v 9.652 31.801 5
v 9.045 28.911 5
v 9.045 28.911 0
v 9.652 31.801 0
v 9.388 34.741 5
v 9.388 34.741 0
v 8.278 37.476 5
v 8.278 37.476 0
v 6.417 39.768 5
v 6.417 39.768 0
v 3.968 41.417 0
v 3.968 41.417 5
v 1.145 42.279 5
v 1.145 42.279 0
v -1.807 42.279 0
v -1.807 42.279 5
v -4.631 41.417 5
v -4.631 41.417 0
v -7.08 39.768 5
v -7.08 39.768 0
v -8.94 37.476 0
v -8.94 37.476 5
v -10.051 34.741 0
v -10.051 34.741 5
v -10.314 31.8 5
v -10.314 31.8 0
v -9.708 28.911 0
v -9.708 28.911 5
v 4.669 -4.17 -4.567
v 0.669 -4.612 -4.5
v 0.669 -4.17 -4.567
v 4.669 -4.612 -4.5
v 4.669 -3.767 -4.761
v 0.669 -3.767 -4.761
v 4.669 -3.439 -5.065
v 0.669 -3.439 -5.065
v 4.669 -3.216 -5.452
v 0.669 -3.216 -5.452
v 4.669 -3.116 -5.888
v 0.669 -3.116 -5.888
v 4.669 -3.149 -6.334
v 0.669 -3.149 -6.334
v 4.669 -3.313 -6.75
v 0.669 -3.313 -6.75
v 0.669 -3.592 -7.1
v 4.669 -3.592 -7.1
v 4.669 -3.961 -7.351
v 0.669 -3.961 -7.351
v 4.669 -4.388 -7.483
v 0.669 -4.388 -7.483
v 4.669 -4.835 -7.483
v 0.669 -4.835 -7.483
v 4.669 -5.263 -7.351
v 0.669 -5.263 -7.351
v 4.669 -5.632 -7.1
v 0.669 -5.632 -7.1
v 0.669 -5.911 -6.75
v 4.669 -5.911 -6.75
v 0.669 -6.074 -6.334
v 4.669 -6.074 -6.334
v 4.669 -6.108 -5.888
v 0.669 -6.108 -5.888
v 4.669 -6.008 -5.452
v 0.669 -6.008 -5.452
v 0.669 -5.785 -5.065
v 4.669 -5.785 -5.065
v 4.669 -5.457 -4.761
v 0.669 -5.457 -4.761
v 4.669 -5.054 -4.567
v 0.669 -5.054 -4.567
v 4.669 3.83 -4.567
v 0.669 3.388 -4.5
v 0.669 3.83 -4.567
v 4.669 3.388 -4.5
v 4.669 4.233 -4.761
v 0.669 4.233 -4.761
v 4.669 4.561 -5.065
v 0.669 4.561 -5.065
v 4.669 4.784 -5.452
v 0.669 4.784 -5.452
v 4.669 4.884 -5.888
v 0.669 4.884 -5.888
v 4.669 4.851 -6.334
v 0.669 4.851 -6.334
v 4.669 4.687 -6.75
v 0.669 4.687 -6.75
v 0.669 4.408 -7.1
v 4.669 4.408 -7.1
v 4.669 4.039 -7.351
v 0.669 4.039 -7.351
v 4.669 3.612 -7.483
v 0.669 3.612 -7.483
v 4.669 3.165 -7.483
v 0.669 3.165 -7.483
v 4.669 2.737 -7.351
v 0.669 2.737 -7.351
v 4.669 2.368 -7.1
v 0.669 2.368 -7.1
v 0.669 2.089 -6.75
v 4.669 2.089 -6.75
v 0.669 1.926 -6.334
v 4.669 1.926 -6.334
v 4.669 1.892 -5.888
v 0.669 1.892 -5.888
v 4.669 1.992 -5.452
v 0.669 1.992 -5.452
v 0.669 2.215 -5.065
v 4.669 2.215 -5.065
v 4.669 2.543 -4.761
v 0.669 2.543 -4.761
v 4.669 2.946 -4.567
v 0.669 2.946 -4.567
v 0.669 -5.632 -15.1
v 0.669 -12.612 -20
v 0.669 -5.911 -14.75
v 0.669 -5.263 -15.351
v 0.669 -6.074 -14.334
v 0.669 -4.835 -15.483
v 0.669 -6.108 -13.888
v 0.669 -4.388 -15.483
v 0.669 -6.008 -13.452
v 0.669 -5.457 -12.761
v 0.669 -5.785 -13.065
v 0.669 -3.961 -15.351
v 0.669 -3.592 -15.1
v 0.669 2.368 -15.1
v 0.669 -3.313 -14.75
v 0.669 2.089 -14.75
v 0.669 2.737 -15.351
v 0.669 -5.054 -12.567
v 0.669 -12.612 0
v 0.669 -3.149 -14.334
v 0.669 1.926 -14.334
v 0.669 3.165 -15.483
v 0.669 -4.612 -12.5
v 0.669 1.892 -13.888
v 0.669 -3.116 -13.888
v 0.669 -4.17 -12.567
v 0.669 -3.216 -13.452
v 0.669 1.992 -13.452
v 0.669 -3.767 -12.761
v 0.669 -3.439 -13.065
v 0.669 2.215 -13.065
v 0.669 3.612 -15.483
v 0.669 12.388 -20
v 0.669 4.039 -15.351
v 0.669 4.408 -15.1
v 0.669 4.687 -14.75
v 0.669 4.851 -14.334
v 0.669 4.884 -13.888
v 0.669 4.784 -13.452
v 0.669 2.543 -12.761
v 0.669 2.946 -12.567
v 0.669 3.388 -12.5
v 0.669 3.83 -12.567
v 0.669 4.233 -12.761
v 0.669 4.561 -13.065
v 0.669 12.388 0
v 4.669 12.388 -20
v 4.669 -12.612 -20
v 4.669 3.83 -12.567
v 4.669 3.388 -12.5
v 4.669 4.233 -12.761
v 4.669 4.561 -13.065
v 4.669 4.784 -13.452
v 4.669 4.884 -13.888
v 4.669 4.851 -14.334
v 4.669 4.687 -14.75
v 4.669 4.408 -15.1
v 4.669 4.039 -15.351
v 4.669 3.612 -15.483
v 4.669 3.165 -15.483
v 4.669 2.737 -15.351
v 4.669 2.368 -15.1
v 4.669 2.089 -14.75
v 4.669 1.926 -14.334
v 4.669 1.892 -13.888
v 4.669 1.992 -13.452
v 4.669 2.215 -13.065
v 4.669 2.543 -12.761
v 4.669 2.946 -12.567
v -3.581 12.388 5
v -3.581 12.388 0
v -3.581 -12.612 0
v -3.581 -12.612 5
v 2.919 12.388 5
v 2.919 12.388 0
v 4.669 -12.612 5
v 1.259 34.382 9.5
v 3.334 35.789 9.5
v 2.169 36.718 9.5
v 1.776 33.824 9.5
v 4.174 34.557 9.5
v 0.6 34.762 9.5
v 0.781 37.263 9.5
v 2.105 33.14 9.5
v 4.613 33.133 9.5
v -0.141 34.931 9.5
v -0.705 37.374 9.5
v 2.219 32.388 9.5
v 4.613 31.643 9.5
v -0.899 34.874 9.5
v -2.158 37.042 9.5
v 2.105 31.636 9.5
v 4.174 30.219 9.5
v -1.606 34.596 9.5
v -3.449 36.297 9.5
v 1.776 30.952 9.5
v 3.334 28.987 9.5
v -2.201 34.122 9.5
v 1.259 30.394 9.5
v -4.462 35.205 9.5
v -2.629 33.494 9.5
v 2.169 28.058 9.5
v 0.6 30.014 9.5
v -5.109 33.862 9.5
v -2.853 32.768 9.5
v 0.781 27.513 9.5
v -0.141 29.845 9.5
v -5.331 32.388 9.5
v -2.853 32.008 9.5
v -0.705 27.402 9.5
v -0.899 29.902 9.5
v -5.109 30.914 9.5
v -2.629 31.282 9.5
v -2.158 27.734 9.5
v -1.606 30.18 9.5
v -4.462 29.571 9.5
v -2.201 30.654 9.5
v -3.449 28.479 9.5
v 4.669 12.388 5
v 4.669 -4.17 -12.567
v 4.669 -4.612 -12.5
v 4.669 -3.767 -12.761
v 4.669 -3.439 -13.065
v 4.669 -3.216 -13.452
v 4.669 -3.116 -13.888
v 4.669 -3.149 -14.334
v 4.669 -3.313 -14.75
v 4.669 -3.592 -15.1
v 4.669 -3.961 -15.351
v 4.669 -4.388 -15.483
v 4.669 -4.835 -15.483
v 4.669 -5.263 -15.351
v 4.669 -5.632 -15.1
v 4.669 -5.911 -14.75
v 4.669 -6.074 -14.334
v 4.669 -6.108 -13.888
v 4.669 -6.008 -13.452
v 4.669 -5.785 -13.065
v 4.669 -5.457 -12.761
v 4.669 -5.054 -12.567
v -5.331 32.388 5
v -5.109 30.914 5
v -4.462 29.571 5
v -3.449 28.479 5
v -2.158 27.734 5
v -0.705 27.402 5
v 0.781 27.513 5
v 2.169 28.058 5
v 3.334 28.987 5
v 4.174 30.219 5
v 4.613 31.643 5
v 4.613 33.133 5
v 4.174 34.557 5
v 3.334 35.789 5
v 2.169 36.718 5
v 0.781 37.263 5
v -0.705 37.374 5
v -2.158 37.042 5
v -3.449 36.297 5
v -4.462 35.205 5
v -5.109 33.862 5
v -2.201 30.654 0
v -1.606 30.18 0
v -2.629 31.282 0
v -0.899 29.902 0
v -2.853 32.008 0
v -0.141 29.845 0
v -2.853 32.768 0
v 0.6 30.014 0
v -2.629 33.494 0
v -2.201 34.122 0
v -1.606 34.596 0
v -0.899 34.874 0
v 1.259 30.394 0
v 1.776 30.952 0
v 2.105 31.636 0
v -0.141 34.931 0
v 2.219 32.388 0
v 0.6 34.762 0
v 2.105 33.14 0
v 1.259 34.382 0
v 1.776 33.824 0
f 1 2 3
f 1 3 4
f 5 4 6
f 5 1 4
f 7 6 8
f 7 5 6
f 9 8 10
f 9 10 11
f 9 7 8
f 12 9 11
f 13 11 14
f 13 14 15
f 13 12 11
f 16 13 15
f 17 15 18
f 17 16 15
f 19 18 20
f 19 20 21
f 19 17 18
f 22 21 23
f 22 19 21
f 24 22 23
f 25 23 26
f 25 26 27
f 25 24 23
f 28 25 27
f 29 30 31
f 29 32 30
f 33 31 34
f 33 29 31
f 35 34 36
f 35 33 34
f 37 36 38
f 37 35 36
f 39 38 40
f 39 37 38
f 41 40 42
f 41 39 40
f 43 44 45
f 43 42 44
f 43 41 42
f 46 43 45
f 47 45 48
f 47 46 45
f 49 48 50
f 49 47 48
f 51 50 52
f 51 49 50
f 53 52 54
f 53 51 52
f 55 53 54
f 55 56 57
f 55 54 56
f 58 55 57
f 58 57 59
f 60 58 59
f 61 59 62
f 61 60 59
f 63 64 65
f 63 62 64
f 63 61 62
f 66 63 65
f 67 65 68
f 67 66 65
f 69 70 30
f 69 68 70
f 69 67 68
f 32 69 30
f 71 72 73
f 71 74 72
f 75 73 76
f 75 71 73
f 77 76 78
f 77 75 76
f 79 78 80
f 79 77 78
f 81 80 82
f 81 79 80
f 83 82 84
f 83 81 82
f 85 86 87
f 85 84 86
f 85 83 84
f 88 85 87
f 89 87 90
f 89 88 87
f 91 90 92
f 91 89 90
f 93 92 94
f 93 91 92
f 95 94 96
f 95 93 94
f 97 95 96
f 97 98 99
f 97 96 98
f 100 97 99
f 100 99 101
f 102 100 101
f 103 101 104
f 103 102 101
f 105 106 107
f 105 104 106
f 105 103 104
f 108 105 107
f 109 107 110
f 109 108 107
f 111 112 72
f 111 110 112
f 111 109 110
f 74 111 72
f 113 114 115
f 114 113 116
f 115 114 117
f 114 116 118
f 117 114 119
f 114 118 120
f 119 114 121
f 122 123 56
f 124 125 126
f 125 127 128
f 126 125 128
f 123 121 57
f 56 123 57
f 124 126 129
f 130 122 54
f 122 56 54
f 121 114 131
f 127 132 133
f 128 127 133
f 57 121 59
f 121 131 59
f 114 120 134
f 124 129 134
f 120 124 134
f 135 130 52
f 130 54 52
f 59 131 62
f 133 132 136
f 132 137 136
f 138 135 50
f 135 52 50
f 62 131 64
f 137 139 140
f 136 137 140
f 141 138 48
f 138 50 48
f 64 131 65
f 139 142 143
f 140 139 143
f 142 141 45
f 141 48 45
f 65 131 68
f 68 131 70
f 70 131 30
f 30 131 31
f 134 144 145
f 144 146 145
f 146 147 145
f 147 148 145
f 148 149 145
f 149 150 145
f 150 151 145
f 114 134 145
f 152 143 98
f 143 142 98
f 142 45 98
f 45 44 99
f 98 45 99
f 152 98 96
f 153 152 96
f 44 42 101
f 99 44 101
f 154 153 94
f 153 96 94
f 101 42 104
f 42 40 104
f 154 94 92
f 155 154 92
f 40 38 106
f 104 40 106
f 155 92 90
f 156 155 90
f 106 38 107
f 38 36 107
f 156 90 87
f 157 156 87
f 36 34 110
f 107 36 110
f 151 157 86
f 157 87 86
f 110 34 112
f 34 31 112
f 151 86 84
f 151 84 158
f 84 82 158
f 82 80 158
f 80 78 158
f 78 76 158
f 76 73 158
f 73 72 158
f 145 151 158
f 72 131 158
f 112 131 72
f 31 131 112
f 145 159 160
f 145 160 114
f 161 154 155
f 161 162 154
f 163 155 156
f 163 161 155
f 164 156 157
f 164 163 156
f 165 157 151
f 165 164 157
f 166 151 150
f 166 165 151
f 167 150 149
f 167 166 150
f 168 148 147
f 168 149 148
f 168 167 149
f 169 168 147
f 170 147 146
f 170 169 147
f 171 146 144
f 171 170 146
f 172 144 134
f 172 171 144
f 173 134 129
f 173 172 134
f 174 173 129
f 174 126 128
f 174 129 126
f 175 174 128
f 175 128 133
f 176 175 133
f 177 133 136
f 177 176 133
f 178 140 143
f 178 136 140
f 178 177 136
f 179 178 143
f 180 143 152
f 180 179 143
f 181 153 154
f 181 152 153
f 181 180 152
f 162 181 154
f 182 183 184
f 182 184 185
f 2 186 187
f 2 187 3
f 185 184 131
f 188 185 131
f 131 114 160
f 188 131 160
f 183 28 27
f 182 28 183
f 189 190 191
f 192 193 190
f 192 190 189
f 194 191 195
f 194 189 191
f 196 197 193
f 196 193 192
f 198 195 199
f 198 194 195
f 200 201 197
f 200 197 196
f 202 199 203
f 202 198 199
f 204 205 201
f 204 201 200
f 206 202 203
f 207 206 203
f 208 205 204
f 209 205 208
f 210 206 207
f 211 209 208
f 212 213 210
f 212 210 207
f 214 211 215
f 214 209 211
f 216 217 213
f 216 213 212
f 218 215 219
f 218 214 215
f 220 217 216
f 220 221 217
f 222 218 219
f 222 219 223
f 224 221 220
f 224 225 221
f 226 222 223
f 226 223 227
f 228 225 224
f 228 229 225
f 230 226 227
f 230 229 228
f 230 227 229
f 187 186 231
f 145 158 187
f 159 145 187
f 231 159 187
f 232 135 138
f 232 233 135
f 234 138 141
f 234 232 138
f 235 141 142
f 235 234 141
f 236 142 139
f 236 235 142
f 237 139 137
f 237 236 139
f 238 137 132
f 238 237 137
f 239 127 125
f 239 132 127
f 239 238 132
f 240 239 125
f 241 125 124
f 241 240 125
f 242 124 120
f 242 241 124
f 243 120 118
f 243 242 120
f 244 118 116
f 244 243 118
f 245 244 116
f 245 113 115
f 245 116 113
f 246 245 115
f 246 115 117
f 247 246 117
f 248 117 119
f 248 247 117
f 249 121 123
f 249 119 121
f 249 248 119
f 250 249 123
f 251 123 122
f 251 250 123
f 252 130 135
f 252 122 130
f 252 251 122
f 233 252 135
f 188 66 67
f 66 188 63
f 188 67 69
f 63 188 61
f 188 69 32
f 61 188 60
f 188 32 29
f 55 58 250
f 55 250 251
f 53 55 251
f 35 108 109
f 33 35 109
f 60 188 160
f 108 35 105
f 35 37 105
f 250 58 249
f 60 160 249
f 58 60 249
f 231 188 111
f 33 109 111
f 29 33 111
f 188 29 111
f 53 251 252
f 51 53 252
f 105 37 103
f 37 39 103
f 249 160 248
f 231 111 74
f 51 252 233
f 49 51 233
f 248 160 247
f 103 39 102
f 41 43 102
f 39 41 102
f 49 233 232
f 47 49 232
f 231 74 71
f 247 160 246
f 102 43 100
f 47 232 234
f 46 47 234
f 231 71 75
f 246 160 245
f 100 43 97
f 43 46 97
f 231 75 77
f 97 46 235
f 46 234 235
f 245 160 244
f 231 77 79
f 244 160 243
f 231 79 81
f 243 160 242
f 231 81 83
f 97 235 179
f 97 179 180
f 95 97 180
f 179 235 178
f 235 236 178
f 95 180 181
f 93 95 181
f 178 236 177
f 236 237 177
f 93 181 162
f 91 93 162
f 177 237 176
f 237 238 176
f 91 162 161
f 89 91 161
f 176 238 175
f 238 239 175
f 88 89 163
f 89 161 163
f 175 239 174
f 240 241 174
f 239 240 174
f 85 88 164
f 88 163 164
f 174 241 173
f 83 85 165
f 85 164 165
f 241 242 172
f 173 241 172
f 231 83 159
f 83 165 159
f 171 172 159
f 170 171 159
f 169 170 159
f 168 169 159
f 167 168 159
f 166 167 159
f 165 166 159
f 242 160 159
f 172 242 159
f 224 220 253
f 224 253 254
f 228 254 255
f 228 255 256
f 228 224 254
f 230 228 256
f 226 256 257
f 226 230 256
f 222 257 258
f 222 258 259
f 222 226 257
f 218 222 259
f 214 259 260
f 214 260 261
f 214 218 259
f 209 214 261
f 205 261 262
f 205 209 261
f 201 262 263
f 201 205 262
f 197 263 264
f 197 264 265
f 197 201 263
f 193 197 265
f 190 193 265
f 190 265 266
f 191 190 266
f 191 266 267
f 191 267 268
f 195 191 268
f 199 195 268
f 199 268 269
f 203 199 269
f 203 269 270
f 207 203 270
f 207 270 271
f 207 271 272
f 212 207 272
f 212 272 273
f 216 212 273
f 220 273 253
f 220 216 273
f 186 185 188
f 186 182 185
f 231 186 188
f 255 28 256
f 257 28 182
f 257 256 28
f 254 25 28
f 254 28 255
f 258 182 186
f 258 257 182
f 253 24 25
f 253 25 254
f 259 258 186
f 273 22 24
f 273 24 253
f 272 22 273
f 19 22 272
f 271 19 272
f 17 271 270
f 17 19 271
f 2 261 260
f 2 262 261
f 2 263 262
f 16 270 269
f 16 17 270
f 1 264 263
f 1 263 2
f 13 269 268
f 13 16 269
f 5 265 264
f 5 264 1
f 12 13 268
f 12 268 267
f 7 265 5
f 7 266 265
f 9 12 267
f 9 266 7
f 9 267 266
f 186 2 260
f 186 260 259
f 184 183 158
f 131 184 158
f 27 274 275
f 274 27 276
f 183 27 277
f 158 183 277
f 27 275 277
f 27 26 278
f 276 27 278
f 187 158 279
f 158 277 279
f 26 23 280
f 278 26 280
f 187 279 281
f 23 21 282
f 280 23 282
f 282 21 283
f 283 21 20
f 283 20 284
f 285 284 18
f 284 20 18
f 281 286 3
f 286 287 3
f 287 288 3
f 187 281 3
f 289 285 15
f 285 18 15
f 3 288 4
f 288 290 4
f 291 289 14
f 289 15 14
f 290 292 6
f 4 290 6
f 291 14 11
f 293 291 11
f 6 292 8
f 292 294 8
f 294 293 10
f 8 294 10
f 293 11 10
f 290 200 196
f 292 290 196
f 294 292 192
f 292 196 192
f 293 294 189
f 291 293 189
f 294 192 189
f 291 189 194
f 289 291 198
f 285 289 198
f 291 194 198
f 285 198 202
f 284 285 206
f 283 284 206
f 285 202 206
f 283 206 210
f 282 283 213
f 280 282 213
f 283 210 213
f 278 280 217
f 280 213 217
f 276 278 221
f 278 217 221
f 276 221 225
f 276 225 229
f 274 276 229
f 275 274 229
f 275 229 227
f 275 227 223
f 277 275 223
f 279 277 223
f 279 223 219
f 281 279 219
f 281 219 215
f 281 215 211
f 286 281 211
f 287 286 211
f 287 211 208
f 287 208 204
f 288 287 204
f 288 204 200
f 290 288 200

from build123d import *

# Parameters (mm, degrees)
SKETCH_1_R          = 1.25
EXTRUDE_1_DEPTH     = 5
SKETCH_2_W          = 5
SKETCH_2_H          = 25
EXTRUDE_2_DEPTH     = 4
SKETCH_3_W          = 4
SKETCH_3_H          = 25
EXTRUDE_3_DEPTH     = 20
SKETCH_4_R          = 1.5
CUT_EXTRUDE_1_DEPTH = 20
EXTRUDE_START       = -5
SKETCH_7_R          = 1.25
EXTRUDE_4_DEPTH     = 5
SKETCH_8_R          = 1.5
SKETCH_8_R_2        = 4
EXTRUDE_5_DEPTH     = 5
EXTRUDE_START_2     = 4
SKETCH_14_W         = 25
SKETCH_14_H         = 25
SKETCH_14_R         = 1.5
EXTRUDE_9_DEPTH     = 4
SKETCH_15_W         = 4
SKETCH_15_H         = 25
CUT_EXTRUDE_2_DEPTH = 100
SKETCH_16_R         = 10.000418411
SKETCH_16_R_2       = 2.55
EXTRUDE_10_DEPTH    = 5
EXTRUDE_START_3     = 4.5
SKETCH_18_R         = 5
SKETCH_18_R_2       = 2.55
EXTRUDE_11_DEPTH    = 4.5
SKETCH_19_W         = 25
SKETCH_19_H         = 25
SKETCH_19_R         = 1.5
EXTRUDE_12_DEPTH    = 4
SKETCH_20_W         = 25
SKETCH_20_H         = 25
CUT_EXTRUDE_3_DEPTH = 4
SKETCH_21_W         = 1.749900533
SKETCH_21_H         = 25
EXTRUDE_13_DEPTH    = 20
CUT_EXTRUDE_START   = -20
SKETCH_22_R         = 1.5
CUT_EXTRUDE_4_DEPTH = 20
SKETCH_23_W         = 25
SKETCH_23_H         = 25
CUT_EXTRUDE_5_DEPTH = 4
SKETCH_24_W         = 1.749900533
SKETCH_24_H         = 25
EXTRUDE_14_DEPTH    = 5


with BuildPart() as part:
    # 草图1 → 凸台-拉伸1 (new body)
    with BuildSketch(Plane.XY):
        Polygon((-3.581151343, -8.027992706), (-3.581151343, -12.611885422), (2.918848657, -12.611885422), (2.918848657, -6.641886627), (2.918848657, 12.388114578), (-3.581151343, 12.388114578), align=None)
        with Locations((-0.081151343, 8.237522913)):
            Circle(SKETCH_1_R, mode=Mode.SUBTRACT)
        with Locations((-0.081151343, 2.787522913)):
            Circle(SKETCH_1_R, mode=Mode.SUBTRACT)
        with Locations((-0.081151343, -2.662477087)):
            Circle(SKETCH_1_R, mode=Mode.SUBTRACT)
        with Locations((-0.000846901, -8.111885422)):
            Circle(SKETCH_1_R, mode=Mode.SUBTRACT)
    extrude(amount=EXTRUDE_1_DEPTH)

    # 草图2 → 凸台-拉伸2 (add)
    with BuildSketch(Plane.ZY.offset(3.581151343)):
        with Locations((2.5, -0.111885422)):
            Rectangle(SKETCH_2_W, SKETCH_2_H)
    extrude(amount=EXTRUDE_2_DEPTH)

    # 草图3 → 凸台-拉伸3 (add)
    with BuildSketch(Plane(origin=(0, 0, 0), x_dir=(-1, 0, 0), z_dir=(0, 0, -1))):
        with Locations((5.581151343, -0.111885422)):
            Rectangle(SKETCH_3_W, SKETCH_3_H)
    extrude(amount=EXTRUDE_3_DEPTH)

    # 草图4 → 切除-拉伸1 (cut)
    with BuildSketch(Plane(origin=(-3.581151343, 0, 0), x_dir=(0, 0, -1), z_dir=(1, 0, 0))):
        with Locations(Location((6, 3.388114578, 0), (0, 0, 90))):
            Circle(SKETCH_4_R)
        with Locations(Location((14, 3.388114578, 0), (0, 0, 180))):
            Circle(SKETCH_4_R)
        with Locations(Location((14, -4.611885422, 0), (0, 0, 90))):
            Circle(SKETCH_4_R)
        with Locations(Location((6, -4.611885422, 0), (0, 0, 180))):
            Circle(SKETCH_4_R)
    extrude(amount=-CUT_EXTRUDE_1_DEPTH, mode=Mode.SUBTRACT)

    # 草图7 → 凸台-拉伸4 (add)
    with BuildSketch(Plane.XY.offset(5).offset(EXTRUDE_START)):
        with Locations((-0.081151343, 8.237522913)):
            Circle(SKETCH_7_R)
        with Locations((-0.081151343, 2.787522913)):
            Circle(SKETCH_7_R)
        with Locations((-0.081151343, -2.662477087)):
            Circle(SKETCH_7_R)
        with Locations((-0.000846901, -8.111885422)):
            Circle(SKETCH_7_R)
    extrude(amount=EXTRUDE_4_DEPTH)

    # 草图8 → 凸台-拉伸5 (add)
    with BuildSketch(Plane.XY.offset(5)):
        with BuildLine():
            ThreePointArc((9.045368421, 28.911309576), (-0.331303735, 42.388418969), (-9.707833242, 28.911210329))
            Line((-9.707833242, 28.911210329), (-3.581151343, 12.388114578))
            Line((-3.581151343, 12.388114578), (2.918848657, 12.388114578))
            Line((2.918848657, 12.388114578), (9.045368421, 28.911309576))
        make_face()
        with Locations((-0.33125081, 25.388000558)):
            Circle(SKETCH_8_R, mode=Mode.SUBTRACT)
        with Locations((-7.33125081, 32.388000558)):
            Circle(SKETCH_8_R, mode=Mode.SUBTRACT)
        with Locations((-0.33125081, 32.388000558)):
            Circle(SKETCH_8_R_2, mode=Mode.SUBTRACT)
        with Locations((-0.33125081, 39.388000558)):
            Circle(SKETCH_8_R, mode=Mode.SUBTRACT)
        with Locations((6.668848657, 32.388114578)):
            Circle(SKETCH_8_R, mode=Mode.SUBTRACT)
    extrude(amount=-EXTRUDE_5_DEPTH)

    # 草图14 → 凸台-拉伸9 (add)
    with BuildSketch(Plane(origin=(2.918848657, 0, 0), x_dir=(0, 0, -1), z_dir=(1, 0, 0)).offset(EXTRUDE_START_2)):
        with Locations((7.5, -0.111885422)):
            Rectangle(SKETCH_14_W, SKETCH_14_H)
        with Locations(Location((6, 3.388114578, 0), (0, 0, 90))):
            Circle(SKETCH_14_R, mode=Mode.SUBTRACT)
        with Locations(Location((14, 3.388114578, 0), (0, 0, 180))):
            Circle(SKETCH_14_R, mode=Mode.SUBTRACT)
        with Locations(Location((14, -4.611885422, 0), (0, 0, 90))):
            Circle(SKETCH_14_R, mode=Mode.SUBTRACT)
        with Locations(Location((6, -4.611885422, 0), (0, 0, 180))):
            Circle(SKETCH_14_R, mode=Mode.SUBTRACT)
    extrude(amount=-EXTRUDE_9_DEPTH)

    # 草图15 → 切除-拉伸2 (cut)
    with BuildSketch(Plane(origin=(0, 0, -20), x_dir=(-1, 0, 0), z_dir=(0, 0, -1))):
        with Locations((5.581151343, -0.111885422)):
            Rectangle(SKETCH_15_W, SKETCH_15_H)
    extrude(amount=-CUT_EXTRUDE_2_DEPTH, mode=Mode.SUBTRACT)

    # 草图16 → 凸台-拉伸10 (add)
    with BuildSketch(Plane.XY.offset(5)):
        with Locations((-0.33125081, 32.388000558)):
            Circle(SKETCH_16_R)
        with Locations((-0.33125081, 32.388000558)):
            Circle(SKETCH_16_R_2, mode=Mode.SUBTRACT)
    extrude(amount=-EXTRUDE_10_DEPTH)

    # 草图18 → 凸台-拉伸11 (add)
    with BuildSketch(Plane.XY.offset(5).offset(EXTRUDE_START_3)):
        with Locations(Location((-0.33125081, 32.388000558, 0), (0, 0, 180))):
            Circle(SKETCH_18_R)
        with Locations((-0.33125081, 32.388000558)):
            Circle(SKETCH_18_R_2, mode=Mode.SUBTRACT)
    extrude(amount=-EXTRUDE_11_DEPTH)

    # 草图19 → 凸台-拉伸12 (add)
    with BuildSketch(Plane.ZY.offset(3.581151343)):
        with Locations((-7.5, -0.111885422)):
            Rectangle(SKETCH_19_W, SKETCH_19_H)
        with Locations(Location((-14, 3.388114578, 0), (0, 0, 90))):
            Circle(SKETCH_19_R, mode=Mode.SUBTRACT)
        with Locations(Location((-6, 3.388114578, 0), (0, 0, 90))):
            Circle(SKETCH_19_R, mode=Mode.SUBTRACT)
        with Locations(Location((-14, -4.611885422, 0), (0, 0, 90))):
            Circle(SKETCH_19_R, mode=Mode.SUBTRACT)
        with Locations(Location((-6, -4.611885422, 0), (0, 0, 90))):
            Circle(SKETCH_19_R, mode=Mode.SUBTRACT)
    extrude(amount=EXTRUDE_12_DEPTH)

    # 草图20 → 切除-拉伸3 (cut)
    with BuildSketch(Plane(origin=(6.918848657, 0, 0), x_dir=(0, 0, -1), z_dir=(1, 0, 0))):
        with Locations((7.5, -0.111885422)):
            Rectangle(SKETCH_20_W, SKETCH_20_H)
    extrude(amount=-CUT_EXTRUDE_3_DEPTH, mode=Mode.SUBTRACT)

    # 草图21 → 凸台-拉伸13 (add)
    with BuildSketch(Plane(origin=(0, 0, 0), x_dir=(-1, 0, 0), z_dir=(0, 0, -1))):
        Polygon((-0.66874919, -12.611885422), (-0.66874919, 5.526794347), (-0.66874919, 12.388114578), (-2.918848657, 12.388114578), (-2.918848657, -12.611885422), align=None)
        with Locations((-3.793798924, -0.111885422)):
            Rectangle(SKETCH_21_W, SKETCH_21_H)
    extrude(amount=EXTRUDE_13_DEPTH)

    # 草图22 → 切除-拉伸4 (cut)
    with BuildSketch(Plane.ZY.offset(7.581151343).offset(CUT_EXTRUDE_START)):
        with Locations((-14, 3.388114578)):
            Circle(SKETCH_22_R)
        with Locations((-6, 3.388114578)):
            Circle(SKETCH_22_R)
        with Locations((-14, -4.611885422)):
            Circle(SKETCH_22_R)
        with Locations((-6, -4.611885422)):
            Circle(SKETCH_22_R)
    extrude(amount=CUT_EXTRUDE_4_DEPTH, mode=Mode.SUBTRACT)

    # 草图23 → 切除-拉伸5 (cut)
    with BuildSketch(Plane.ZY.offset(7.581151343)):
        with Locations((-7.5, -0.111885422)):
            Rectangle(SKETCH_23_W, SKETCH_23_H)
    extrude(amount=-CUT_EXTRUDE_5_DEPTH, mode=Mode.SUBTRACT)

    # 草图24 → 凸台-拉伸14 (add)
    with BuildSketch(Plane.XY):
        with Locations((3.793798924, -0.111885422)):
            Rectangle(SKETCH_24_W, SKETCH_24_H)
    extrude(amount=EXTRUDE_14_DEPTH)


solid = part.part
